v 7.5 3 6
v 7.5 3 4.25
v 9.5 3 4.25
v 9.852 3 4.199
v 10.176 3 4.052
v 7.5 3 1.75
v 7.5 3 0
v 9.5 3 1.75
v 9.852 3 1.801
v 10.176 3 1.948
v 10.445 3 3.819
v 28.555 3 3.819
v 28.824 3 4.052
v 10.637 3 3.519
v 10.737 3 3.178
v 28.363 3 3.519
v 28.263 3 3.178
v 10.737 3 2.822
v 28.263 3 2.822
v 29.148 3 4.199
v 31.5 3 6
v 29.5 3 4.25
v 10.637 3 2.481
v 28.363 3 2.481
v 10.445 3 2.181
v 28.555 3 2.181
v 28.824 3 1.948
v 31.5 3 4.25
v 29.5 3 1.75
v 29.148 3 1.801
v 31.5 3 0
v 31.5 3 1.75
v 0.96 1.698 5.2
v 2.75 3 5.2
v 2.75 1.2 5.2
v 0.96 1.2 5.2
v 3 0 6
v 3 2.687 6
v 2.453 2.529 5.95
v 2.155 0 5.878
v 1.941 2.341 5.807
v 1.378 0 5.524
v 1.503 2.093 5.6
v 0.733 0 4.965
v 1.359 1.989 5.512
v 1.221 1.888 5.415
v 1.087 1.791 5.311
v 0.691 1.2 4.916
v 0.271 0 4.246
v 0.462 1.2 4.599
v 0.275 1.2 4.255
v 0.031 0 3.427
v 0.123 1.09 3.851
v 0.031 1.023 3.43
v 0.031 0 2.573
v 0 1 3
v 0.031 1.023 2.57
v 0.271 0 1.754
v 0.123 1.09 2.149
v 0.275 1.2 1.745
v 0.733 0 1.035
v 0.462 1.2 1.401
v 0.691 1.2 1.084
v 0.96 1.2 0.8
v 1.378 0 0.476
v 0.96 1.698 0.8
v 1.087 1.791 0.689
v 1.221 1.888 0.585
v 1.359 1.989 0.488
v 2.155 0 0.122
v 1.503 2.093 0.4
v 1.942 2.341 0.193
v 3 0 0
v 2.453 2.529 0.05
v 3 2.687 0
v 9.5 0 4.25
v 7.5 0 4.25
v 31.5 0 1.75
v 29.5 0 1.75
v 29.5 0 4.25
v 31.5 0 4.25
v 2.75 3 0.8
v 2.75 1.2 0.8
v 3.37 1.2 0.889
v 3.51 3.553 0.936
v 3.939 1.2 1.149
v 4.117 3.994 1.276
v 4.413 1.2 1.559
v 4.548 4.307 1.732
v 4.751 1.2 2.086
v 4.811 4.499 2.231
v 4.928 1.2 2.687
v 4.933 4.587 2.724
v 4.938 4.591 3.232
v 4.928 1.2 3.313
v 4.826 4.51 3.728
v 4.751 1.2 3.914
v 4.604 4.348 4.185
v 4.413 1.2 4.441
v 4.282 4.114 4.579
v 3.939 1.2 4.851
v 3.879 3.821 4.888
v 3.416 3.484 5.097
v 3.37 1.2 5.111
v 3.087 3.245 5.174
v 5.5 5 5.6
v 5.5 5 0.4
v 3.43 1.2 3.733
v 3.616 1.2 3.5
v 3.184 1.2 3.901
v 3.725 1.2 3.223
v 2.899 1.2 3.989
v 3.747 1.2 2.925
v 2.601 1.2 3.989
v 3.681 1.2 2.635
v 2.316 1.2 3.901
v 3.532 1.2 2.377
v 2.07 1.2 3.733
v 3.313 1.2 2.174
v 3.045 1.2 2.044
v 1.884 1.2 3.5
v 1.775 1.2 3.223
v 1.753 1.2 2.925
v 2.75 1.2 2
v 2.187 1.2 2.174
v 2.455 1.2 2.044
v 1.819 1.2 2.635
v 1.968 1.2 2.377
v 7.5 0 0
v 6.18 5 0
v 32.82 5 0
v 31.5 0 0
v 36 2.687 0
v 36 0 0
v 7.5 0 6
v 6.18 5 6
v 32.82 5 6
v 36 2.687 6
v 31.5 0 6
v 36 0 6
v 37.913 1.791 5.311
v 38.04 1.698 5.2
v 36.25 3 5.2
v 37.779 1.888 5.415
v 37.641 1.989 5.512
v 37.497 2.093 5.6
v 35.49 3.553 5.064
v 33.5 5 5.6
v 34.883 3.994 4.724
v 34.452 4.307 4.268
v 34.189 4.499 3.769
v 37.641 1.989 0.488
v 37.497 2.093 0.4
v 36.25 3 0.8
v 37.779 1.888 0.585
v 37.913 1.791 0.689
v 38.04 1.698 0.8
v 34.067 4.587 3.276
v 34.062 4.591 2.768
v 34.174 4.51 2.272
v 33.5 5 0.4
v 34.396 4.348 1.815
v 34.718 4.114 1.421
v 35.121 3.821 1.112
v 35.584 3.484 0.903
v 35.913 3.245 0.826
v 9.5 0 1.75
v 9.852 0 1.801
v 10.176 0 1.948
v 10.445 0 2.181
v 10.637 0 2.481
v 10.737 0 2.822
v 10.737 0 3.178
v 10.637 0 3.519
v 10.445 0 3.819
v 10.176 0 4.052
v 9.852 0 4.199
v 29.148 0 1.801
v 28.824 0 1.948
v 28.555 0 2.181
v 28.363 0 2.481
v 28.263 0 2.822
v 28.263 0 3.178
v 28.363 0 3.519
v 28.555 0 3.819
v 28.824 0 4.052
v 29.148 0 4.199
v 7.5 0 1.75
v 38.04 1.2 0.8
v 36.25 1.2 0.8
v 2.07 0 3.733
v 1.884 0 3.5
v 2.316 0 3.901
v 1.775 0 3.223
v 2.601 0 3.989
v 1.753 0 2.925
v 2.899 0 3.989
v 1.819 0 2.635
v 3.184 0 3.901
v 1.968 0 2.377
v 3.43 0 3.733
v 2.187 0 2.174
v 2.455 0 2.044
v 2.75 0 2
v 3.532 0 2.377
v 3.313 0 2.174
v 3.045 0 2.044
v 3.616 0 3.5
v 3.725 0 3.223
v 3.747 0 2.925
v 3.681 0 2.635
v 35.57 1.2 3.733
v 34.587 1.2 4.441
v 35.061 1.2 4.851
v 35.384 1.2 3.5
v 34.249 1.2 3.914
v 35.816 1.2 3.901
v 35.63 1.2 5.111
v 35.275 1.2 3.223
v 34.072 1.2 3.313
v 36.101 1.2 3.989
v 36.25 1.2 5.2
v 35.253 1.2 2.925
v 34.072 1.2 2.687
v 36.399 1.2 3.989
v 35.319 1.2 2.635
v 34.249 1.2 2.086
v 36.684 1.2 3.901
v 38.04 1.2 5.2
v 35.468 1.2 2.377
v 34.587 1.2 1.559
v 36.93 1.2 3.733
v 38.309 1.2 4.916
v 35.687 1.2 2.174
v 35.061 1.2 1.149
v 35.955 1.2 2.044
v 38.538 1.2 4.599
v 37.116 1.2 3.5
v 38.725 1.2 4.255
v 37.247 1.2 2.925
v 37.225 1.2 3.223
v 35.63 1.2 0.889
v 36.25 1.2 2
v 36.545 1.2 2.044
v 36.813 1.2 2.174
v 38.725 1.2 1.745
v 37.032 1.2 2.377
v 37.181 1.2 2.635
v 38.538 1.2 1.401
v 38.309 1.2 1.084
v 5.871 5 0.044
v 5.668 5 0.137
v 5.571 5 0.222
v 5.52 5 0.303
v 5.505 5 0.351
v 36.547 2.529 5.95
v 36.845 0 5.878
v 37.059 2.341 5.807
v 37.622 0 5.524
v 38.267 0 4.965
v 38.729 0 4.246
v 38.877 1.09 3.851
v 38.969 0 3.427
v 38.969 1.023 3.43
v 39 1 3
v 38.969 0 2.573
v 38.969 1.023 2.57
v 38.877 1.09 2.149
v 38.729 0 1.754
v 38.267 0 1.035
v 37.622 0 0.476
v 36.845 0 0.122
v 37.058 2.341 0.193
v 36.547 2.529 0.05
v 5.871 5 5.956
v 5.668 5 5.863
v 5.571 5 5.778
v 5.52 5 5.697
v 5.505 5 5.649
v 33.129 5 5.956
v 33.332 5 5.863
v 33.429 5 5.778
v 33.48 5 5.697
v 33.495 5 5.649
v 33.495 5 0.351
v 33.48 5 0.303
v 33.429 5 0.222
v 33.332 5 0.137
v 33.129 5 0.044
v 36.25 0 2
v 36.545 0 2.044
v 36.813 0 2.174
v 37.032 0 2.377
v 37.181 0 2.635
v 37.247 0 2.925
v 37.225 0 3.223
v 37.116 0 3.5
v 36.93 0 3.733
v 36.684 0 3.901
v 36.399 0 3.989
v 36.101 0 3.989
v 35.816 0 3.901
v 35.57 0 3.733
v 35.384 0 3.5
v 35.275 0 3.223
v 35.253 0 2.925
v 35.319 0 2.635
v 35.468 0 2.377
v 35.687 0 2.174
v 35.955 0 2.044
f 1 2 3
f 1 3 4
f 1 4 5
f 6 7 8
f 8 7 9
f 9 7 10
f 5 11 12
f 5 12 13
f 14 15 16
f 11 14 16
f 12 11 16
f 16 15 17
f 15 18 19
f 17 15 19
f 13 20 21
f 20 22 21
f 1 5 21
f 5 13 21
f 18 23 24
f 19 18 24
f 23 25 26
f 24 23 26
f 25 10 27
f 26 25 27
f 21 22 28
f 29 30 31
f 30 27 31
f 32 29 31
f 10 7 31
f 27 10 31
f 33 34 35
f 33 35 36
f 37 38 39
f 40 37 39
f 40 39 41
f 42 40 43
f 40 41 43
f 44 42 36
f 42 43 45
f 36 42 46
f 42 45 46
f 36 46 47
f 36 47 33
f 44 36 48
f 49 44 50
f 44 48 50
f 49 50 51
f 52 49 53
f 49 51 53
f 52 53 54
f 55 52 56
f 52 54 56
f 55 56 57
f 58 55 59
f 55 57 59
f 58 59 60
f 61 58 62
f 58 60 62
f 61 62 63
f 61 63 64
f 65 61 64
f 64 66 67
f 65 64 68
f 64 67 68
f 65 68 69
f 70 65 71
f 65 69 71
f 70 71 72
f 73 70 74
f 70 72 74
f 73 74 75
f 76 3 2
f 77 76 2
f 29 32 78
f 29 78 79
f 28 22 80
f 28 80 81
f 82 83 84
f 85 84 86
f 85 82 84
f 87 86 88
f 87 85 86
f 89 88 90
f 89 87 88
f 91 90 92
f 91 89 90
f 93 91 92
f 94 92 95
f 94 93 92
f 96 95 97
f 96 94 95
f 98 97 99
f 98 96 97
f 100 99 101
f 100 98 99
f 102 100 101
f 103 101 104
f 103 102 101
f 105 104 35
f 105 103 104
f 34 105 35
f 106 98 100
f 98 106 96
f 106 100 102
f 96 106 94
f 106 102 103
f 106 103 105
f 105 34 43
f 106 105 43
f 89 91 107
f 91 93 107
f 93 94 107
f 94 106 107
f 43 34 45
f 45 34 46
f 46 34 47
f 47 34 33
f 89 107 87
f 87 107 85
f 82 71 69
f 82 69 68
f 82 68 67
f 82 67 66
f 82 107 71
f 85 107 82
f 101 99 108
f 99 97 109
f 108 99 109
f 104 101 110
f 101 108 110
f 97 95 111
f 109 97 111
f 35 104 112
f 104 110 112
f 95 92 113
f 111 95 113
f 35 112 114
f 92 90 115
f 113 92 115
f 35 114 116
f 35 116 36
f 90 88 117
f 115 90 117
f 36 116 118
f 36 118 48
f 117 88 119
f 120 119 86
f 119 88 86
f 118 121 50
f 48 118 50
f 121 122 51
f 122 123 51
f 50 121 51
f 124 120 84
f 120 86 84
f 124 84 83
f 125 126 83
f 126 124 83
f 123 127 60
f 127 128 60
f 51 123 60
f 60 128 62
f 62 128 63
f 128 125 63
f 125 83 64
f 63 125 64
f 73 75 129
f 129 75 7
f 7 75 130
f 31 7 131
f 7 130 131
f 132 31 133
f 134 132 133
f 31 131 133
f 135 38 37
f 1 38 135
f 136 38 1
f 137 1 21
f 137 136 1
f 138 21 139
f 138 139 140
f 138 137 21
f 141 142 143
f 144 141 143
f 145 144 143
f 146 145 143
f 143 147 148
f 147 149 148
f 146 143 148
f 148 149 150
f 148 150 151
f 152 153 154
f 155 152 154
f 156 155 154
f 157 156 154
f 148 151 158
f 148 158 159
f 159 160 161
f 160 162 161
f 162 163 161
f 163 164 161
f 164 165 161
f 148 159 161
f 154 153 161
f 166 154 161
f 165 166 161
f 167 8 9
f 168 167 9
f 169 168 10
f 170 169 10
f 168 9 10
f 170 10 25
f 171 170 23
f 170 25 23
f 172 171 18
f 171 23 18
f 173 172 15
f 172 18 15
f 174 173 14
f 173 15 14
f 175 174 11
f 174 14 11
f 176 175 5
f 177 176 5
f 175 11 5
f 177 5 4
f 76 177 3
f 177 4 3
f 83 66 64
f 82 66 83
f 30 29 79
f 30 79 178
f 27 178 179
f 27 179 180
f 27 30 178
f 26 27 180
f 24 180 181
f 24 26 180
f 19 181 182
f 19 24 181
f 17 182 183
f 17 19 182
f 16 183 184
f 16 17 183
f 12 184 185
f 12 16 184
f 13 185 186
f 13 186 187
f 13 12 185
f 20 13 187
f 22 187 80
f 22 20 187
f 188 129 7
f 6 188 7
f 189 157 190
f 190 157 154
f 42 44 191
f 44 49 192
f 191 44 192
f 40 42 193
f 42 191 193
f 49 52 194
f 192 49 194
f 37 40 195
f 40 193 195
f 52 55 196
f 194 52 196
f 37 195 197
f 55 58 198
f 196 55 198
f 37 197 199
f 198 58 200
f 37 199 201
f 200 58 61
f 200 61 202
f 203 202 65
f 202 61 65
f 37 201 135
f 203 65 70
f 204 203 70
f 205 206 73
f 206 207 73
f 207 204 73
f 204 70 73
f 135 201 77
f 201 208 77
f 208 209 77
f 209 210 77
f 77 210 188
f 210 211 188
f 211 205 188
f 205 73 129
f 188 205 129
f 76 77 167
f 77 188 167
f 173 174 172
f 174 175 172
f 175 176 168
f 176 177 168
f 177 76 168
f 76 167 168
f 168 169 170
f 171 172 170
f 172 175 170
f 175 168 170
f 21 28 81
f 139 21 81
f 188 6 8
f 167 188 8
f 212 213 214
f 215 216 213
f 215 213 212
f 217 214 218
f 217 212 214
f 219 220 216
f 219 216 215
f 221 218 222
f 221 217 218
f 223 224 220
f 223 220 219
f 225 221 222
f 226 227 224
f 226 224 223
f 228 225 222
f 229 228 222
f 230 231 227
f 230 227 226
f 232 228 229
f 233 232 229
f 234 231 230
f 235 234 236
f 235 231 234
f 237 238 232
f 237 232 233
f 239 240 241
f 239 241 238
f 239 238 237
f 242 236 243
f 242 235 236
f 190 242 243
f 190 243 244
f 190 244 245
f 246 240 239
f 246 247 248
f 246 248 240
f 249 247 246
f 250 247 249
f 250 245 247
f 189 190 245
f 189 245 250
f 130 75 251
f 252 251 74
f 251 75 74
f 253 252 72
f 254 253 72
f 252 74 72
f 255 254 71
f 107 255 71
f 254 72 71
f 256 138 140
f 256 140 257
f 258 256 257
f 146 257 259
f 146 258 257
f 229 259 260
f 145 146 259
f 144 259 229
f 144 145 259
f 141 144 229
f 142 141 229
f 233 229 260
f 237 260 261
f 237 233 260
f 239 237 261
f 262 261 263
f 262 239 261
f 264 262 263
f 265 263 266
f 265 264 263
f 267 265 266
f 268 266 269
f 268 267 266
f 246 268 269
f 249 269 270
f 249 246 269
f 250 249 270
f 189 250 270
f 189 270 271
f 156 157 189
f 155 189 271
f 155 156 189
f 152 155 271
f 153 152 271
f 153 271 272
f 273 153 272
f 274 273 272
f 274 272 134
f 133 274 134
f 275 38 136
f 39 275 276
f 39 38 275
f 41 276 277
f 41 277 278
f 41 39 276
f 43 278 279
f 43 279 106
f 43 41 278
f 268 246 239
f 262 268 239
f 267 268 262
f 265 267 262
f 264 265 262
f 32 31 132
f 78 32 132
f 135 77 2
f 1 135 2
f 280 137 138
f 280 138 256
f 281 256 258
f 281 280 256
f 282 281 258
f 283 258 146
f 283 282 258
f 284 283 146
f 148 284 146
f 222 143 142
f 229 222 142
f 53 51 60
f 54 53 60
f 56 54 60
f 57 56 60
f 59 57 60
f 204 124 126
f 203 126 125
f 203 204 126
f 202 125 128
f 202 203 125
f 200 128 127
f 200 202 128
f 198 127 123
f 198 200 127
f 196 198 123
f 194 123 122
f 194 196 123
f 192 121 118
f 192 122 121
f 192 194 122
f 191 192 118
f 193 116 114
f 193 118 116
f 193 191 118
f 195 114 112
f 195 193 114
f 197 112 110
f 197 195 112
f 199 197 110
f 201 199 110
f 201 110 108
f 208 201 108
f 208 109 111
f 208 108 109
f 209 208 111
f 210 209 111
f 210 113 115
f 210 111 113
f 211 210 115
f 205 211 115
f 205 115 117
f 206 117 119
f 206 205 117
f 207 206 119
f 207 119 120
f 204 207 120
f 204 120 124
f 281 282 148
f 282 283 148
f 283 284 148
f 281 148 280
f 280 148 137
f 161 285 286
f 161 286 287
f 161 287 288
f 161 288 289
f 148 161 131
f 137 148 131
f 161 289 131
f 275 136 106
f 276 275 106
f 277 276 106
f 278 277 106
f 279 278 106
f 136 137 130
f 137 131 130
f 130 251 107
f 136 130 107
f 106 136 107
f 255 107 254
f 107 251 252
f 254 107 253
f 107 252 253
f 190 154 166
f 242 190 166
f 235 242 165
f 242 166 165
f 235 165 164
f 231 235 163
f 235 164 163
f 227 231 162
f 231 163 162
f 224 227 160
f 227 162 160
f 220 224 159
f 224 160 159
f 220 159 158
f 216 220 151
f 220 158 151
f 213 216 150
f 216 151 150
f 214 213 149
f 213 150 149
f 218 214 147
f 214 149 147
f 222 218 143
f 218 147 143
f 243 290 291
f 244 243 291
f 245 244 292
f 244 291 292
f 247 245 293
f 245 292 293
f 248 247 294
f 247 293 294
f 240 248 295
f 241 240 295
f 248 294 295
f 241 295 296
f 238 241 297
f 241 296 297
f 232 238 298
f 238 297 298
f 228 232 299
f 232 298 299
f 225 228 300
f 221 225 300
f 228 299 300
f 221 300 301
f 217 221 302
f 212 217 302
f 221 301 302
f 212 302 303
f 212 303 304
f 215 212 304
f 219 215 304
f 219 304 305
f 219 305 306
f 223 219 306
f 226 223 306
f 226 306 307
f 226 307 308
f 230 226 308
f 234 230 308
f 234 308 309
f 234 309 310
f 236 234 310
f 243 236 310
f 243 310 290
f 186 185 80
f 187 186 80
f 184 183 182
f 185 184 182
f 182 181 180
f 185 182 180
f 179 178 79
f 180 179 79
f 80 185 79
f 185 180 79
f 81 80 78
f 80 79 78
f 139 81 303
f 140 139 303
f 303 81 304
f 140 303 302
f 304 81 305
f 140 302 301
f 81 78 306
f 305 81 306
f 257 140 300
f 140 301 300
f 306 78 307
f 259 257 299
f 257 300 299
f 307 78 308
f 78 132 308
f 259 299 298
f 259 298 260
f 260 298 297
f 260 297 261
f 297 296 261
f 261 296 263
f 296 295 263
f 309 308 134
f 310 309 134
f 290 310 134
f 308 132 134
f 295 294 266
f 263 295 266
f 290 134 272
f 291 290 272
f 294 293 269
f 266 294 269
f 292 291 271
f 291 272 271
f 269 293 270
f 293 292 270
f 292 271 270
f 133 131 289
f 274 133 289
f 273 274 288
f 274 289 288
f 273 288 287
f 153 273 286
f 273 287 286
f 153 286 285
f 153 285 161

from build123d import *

# Parameters (mm, degrees)
AUFSATZ_LINEAR_AUSTRAGEN1_DEPTH = 6
SKIZZE4_R                       = 1
SCHNITT_LINEAR_AUSTRAGEN1_DEPTH = 3
SCHNITT_LINEAR_AUSTRAGEN2_DEPTH = 3.8
VERRUNDUNG1_R                   = 0.4
SCHNITT_LINEAR_AUSTRAGEN6_DEPTH = 6
AUFSATZ_LINEAR_AUSTRAGEN2_DEPTH = 3


with BuildPart() as part:
    # Skizze1 → Aufsatz-Linear austragen1 (new body)
    with BuildSketch(Plane.XY):
        Polygon((0, 0), (7.5, 0), (7.5, 3), (31.5, 3), (31.5, 0), (39, 0), (39, 1), (33.5, 5), (5.5, 5), (0, 1), align=None)
    extrude(amount=AUFSATZ_LINEAR_AUSTRAGEN1_DEPTH)

    # Skizze4 → Schnitt-Linear austragen1 (cut)
    with BuildSketch(Plane.XZ):
        with Locations(Location((36.25, 3, 0), (0, 0, 270))):
            Circle(SKIZZE4_R)
    schnitt_linear_austragen1 = extrude(amount=-SCHNITT_LINEAR_AUSTRAGEN1_DEPTH, mode=Mode.SUBTRACT)

    # Skizze5 → Schnitt-Linear austragen2 (cut)
    with BuildSketch(Plane(origin=(0, 5, 0), x_dir=(-1, 0, 0), z_dir=(0, -1, 0))):
        with BuildLine():
            Line((-36.25, -5.2), (-39, -5.2))
            Line((-39, -5.2), (-39, -0.8))
            Line((-39, -0.8), (-36.25, -0.8))
            ThreePointArc((-36.25, -0.8), (-34.05, -3), (-36.25, -5.2))
        make_face()
    schnitt_linear_austragen2 = extrude(amount=SCHNITT_LINEAR_AUSTRAGEN2_DEPTH, mode=Mode.SUBTRACT)

    # Spiegeln1: Schnitt-Linear austragen1, Schnitt-Linear austragen2 across plane
    add(schnitt_linear_austragen1.mirror(Plane.ZY.offset(-19.5)), mode=Mode.SUBTRACT)
    add(schnitt_linear_austragen2.mirror(Plane.ZY.offset(-19.5)), mode=Mode.SUBTRACT)

    # Verrundung1
    verrundung1_edges = [part.edges().sort_by_distance(p)[0] for p in [
        (36.25, 3, 0),
        (36.25, 3, 6),
        (2.75, 3, 6),
        (2.75, 3, 0),
    ]]
    fillet(verrundung1_edges, radius=VERRUNDUNG1_R)

    # Skizze10 → Schnitt-Linear austragen6 (cut)
    with BuildSketch(Plane(origin=(0, 5, 0), x_dir=(-1, 0, 0), z_dir=(0, -1, 0))):
        with BuildLine():
            Line((-36, 0), (-39, 0))
            Line((-39, 0), (-39.338530881, 0))
            Line((-39.338530881, 0), (-39.338530881, -6))
            Line((-39.338530881, -6), (-36, -6))
            ThreePointArc((-36, -6), (-39, -3), (-36, 0))
        make_face()
    schnitt_linear_austragen6 = extrude(amount=SCHNITT_LINEAR_AUSTRAGEN6_DEPTH, mode=Mode.SUBTRACT)

    # Spiegeln2: Schnitt-Linear austragen6 across plane
    add(schnitt_linear_austragen6.mirror(Plane.ZY.offset(-19.5)), mode=Mode.SUBTRACT)

    # Skizze12 → Aufsatz-Linear austragen2 (add)
    with BuildSketch(Plane.XZ.offset(-3)):
        with BuildLine():
            Line((31.5, 1.75), (29.5, 1.75))
            ThreePointArc((29.5, 1.75), (28.25, 3), (29.5, 4.25))
            Line((29.5, 4.25), (31.5, 4.25))
            Line((31.5, 4.25), (31.5, 1.75))
        make_face()
    aufsatz_linear_austragen2 = extrude(amount=AUFSATZ_LINEAR_AUSTRAGEN2_DEPTH)

    # Spiegeln3: Aufsatz-Linear austragen2 across plane
    add(aufsatz_linear_austragen2.mirror(Plane.ZY.offset(-19.5)))


solid = part.part
